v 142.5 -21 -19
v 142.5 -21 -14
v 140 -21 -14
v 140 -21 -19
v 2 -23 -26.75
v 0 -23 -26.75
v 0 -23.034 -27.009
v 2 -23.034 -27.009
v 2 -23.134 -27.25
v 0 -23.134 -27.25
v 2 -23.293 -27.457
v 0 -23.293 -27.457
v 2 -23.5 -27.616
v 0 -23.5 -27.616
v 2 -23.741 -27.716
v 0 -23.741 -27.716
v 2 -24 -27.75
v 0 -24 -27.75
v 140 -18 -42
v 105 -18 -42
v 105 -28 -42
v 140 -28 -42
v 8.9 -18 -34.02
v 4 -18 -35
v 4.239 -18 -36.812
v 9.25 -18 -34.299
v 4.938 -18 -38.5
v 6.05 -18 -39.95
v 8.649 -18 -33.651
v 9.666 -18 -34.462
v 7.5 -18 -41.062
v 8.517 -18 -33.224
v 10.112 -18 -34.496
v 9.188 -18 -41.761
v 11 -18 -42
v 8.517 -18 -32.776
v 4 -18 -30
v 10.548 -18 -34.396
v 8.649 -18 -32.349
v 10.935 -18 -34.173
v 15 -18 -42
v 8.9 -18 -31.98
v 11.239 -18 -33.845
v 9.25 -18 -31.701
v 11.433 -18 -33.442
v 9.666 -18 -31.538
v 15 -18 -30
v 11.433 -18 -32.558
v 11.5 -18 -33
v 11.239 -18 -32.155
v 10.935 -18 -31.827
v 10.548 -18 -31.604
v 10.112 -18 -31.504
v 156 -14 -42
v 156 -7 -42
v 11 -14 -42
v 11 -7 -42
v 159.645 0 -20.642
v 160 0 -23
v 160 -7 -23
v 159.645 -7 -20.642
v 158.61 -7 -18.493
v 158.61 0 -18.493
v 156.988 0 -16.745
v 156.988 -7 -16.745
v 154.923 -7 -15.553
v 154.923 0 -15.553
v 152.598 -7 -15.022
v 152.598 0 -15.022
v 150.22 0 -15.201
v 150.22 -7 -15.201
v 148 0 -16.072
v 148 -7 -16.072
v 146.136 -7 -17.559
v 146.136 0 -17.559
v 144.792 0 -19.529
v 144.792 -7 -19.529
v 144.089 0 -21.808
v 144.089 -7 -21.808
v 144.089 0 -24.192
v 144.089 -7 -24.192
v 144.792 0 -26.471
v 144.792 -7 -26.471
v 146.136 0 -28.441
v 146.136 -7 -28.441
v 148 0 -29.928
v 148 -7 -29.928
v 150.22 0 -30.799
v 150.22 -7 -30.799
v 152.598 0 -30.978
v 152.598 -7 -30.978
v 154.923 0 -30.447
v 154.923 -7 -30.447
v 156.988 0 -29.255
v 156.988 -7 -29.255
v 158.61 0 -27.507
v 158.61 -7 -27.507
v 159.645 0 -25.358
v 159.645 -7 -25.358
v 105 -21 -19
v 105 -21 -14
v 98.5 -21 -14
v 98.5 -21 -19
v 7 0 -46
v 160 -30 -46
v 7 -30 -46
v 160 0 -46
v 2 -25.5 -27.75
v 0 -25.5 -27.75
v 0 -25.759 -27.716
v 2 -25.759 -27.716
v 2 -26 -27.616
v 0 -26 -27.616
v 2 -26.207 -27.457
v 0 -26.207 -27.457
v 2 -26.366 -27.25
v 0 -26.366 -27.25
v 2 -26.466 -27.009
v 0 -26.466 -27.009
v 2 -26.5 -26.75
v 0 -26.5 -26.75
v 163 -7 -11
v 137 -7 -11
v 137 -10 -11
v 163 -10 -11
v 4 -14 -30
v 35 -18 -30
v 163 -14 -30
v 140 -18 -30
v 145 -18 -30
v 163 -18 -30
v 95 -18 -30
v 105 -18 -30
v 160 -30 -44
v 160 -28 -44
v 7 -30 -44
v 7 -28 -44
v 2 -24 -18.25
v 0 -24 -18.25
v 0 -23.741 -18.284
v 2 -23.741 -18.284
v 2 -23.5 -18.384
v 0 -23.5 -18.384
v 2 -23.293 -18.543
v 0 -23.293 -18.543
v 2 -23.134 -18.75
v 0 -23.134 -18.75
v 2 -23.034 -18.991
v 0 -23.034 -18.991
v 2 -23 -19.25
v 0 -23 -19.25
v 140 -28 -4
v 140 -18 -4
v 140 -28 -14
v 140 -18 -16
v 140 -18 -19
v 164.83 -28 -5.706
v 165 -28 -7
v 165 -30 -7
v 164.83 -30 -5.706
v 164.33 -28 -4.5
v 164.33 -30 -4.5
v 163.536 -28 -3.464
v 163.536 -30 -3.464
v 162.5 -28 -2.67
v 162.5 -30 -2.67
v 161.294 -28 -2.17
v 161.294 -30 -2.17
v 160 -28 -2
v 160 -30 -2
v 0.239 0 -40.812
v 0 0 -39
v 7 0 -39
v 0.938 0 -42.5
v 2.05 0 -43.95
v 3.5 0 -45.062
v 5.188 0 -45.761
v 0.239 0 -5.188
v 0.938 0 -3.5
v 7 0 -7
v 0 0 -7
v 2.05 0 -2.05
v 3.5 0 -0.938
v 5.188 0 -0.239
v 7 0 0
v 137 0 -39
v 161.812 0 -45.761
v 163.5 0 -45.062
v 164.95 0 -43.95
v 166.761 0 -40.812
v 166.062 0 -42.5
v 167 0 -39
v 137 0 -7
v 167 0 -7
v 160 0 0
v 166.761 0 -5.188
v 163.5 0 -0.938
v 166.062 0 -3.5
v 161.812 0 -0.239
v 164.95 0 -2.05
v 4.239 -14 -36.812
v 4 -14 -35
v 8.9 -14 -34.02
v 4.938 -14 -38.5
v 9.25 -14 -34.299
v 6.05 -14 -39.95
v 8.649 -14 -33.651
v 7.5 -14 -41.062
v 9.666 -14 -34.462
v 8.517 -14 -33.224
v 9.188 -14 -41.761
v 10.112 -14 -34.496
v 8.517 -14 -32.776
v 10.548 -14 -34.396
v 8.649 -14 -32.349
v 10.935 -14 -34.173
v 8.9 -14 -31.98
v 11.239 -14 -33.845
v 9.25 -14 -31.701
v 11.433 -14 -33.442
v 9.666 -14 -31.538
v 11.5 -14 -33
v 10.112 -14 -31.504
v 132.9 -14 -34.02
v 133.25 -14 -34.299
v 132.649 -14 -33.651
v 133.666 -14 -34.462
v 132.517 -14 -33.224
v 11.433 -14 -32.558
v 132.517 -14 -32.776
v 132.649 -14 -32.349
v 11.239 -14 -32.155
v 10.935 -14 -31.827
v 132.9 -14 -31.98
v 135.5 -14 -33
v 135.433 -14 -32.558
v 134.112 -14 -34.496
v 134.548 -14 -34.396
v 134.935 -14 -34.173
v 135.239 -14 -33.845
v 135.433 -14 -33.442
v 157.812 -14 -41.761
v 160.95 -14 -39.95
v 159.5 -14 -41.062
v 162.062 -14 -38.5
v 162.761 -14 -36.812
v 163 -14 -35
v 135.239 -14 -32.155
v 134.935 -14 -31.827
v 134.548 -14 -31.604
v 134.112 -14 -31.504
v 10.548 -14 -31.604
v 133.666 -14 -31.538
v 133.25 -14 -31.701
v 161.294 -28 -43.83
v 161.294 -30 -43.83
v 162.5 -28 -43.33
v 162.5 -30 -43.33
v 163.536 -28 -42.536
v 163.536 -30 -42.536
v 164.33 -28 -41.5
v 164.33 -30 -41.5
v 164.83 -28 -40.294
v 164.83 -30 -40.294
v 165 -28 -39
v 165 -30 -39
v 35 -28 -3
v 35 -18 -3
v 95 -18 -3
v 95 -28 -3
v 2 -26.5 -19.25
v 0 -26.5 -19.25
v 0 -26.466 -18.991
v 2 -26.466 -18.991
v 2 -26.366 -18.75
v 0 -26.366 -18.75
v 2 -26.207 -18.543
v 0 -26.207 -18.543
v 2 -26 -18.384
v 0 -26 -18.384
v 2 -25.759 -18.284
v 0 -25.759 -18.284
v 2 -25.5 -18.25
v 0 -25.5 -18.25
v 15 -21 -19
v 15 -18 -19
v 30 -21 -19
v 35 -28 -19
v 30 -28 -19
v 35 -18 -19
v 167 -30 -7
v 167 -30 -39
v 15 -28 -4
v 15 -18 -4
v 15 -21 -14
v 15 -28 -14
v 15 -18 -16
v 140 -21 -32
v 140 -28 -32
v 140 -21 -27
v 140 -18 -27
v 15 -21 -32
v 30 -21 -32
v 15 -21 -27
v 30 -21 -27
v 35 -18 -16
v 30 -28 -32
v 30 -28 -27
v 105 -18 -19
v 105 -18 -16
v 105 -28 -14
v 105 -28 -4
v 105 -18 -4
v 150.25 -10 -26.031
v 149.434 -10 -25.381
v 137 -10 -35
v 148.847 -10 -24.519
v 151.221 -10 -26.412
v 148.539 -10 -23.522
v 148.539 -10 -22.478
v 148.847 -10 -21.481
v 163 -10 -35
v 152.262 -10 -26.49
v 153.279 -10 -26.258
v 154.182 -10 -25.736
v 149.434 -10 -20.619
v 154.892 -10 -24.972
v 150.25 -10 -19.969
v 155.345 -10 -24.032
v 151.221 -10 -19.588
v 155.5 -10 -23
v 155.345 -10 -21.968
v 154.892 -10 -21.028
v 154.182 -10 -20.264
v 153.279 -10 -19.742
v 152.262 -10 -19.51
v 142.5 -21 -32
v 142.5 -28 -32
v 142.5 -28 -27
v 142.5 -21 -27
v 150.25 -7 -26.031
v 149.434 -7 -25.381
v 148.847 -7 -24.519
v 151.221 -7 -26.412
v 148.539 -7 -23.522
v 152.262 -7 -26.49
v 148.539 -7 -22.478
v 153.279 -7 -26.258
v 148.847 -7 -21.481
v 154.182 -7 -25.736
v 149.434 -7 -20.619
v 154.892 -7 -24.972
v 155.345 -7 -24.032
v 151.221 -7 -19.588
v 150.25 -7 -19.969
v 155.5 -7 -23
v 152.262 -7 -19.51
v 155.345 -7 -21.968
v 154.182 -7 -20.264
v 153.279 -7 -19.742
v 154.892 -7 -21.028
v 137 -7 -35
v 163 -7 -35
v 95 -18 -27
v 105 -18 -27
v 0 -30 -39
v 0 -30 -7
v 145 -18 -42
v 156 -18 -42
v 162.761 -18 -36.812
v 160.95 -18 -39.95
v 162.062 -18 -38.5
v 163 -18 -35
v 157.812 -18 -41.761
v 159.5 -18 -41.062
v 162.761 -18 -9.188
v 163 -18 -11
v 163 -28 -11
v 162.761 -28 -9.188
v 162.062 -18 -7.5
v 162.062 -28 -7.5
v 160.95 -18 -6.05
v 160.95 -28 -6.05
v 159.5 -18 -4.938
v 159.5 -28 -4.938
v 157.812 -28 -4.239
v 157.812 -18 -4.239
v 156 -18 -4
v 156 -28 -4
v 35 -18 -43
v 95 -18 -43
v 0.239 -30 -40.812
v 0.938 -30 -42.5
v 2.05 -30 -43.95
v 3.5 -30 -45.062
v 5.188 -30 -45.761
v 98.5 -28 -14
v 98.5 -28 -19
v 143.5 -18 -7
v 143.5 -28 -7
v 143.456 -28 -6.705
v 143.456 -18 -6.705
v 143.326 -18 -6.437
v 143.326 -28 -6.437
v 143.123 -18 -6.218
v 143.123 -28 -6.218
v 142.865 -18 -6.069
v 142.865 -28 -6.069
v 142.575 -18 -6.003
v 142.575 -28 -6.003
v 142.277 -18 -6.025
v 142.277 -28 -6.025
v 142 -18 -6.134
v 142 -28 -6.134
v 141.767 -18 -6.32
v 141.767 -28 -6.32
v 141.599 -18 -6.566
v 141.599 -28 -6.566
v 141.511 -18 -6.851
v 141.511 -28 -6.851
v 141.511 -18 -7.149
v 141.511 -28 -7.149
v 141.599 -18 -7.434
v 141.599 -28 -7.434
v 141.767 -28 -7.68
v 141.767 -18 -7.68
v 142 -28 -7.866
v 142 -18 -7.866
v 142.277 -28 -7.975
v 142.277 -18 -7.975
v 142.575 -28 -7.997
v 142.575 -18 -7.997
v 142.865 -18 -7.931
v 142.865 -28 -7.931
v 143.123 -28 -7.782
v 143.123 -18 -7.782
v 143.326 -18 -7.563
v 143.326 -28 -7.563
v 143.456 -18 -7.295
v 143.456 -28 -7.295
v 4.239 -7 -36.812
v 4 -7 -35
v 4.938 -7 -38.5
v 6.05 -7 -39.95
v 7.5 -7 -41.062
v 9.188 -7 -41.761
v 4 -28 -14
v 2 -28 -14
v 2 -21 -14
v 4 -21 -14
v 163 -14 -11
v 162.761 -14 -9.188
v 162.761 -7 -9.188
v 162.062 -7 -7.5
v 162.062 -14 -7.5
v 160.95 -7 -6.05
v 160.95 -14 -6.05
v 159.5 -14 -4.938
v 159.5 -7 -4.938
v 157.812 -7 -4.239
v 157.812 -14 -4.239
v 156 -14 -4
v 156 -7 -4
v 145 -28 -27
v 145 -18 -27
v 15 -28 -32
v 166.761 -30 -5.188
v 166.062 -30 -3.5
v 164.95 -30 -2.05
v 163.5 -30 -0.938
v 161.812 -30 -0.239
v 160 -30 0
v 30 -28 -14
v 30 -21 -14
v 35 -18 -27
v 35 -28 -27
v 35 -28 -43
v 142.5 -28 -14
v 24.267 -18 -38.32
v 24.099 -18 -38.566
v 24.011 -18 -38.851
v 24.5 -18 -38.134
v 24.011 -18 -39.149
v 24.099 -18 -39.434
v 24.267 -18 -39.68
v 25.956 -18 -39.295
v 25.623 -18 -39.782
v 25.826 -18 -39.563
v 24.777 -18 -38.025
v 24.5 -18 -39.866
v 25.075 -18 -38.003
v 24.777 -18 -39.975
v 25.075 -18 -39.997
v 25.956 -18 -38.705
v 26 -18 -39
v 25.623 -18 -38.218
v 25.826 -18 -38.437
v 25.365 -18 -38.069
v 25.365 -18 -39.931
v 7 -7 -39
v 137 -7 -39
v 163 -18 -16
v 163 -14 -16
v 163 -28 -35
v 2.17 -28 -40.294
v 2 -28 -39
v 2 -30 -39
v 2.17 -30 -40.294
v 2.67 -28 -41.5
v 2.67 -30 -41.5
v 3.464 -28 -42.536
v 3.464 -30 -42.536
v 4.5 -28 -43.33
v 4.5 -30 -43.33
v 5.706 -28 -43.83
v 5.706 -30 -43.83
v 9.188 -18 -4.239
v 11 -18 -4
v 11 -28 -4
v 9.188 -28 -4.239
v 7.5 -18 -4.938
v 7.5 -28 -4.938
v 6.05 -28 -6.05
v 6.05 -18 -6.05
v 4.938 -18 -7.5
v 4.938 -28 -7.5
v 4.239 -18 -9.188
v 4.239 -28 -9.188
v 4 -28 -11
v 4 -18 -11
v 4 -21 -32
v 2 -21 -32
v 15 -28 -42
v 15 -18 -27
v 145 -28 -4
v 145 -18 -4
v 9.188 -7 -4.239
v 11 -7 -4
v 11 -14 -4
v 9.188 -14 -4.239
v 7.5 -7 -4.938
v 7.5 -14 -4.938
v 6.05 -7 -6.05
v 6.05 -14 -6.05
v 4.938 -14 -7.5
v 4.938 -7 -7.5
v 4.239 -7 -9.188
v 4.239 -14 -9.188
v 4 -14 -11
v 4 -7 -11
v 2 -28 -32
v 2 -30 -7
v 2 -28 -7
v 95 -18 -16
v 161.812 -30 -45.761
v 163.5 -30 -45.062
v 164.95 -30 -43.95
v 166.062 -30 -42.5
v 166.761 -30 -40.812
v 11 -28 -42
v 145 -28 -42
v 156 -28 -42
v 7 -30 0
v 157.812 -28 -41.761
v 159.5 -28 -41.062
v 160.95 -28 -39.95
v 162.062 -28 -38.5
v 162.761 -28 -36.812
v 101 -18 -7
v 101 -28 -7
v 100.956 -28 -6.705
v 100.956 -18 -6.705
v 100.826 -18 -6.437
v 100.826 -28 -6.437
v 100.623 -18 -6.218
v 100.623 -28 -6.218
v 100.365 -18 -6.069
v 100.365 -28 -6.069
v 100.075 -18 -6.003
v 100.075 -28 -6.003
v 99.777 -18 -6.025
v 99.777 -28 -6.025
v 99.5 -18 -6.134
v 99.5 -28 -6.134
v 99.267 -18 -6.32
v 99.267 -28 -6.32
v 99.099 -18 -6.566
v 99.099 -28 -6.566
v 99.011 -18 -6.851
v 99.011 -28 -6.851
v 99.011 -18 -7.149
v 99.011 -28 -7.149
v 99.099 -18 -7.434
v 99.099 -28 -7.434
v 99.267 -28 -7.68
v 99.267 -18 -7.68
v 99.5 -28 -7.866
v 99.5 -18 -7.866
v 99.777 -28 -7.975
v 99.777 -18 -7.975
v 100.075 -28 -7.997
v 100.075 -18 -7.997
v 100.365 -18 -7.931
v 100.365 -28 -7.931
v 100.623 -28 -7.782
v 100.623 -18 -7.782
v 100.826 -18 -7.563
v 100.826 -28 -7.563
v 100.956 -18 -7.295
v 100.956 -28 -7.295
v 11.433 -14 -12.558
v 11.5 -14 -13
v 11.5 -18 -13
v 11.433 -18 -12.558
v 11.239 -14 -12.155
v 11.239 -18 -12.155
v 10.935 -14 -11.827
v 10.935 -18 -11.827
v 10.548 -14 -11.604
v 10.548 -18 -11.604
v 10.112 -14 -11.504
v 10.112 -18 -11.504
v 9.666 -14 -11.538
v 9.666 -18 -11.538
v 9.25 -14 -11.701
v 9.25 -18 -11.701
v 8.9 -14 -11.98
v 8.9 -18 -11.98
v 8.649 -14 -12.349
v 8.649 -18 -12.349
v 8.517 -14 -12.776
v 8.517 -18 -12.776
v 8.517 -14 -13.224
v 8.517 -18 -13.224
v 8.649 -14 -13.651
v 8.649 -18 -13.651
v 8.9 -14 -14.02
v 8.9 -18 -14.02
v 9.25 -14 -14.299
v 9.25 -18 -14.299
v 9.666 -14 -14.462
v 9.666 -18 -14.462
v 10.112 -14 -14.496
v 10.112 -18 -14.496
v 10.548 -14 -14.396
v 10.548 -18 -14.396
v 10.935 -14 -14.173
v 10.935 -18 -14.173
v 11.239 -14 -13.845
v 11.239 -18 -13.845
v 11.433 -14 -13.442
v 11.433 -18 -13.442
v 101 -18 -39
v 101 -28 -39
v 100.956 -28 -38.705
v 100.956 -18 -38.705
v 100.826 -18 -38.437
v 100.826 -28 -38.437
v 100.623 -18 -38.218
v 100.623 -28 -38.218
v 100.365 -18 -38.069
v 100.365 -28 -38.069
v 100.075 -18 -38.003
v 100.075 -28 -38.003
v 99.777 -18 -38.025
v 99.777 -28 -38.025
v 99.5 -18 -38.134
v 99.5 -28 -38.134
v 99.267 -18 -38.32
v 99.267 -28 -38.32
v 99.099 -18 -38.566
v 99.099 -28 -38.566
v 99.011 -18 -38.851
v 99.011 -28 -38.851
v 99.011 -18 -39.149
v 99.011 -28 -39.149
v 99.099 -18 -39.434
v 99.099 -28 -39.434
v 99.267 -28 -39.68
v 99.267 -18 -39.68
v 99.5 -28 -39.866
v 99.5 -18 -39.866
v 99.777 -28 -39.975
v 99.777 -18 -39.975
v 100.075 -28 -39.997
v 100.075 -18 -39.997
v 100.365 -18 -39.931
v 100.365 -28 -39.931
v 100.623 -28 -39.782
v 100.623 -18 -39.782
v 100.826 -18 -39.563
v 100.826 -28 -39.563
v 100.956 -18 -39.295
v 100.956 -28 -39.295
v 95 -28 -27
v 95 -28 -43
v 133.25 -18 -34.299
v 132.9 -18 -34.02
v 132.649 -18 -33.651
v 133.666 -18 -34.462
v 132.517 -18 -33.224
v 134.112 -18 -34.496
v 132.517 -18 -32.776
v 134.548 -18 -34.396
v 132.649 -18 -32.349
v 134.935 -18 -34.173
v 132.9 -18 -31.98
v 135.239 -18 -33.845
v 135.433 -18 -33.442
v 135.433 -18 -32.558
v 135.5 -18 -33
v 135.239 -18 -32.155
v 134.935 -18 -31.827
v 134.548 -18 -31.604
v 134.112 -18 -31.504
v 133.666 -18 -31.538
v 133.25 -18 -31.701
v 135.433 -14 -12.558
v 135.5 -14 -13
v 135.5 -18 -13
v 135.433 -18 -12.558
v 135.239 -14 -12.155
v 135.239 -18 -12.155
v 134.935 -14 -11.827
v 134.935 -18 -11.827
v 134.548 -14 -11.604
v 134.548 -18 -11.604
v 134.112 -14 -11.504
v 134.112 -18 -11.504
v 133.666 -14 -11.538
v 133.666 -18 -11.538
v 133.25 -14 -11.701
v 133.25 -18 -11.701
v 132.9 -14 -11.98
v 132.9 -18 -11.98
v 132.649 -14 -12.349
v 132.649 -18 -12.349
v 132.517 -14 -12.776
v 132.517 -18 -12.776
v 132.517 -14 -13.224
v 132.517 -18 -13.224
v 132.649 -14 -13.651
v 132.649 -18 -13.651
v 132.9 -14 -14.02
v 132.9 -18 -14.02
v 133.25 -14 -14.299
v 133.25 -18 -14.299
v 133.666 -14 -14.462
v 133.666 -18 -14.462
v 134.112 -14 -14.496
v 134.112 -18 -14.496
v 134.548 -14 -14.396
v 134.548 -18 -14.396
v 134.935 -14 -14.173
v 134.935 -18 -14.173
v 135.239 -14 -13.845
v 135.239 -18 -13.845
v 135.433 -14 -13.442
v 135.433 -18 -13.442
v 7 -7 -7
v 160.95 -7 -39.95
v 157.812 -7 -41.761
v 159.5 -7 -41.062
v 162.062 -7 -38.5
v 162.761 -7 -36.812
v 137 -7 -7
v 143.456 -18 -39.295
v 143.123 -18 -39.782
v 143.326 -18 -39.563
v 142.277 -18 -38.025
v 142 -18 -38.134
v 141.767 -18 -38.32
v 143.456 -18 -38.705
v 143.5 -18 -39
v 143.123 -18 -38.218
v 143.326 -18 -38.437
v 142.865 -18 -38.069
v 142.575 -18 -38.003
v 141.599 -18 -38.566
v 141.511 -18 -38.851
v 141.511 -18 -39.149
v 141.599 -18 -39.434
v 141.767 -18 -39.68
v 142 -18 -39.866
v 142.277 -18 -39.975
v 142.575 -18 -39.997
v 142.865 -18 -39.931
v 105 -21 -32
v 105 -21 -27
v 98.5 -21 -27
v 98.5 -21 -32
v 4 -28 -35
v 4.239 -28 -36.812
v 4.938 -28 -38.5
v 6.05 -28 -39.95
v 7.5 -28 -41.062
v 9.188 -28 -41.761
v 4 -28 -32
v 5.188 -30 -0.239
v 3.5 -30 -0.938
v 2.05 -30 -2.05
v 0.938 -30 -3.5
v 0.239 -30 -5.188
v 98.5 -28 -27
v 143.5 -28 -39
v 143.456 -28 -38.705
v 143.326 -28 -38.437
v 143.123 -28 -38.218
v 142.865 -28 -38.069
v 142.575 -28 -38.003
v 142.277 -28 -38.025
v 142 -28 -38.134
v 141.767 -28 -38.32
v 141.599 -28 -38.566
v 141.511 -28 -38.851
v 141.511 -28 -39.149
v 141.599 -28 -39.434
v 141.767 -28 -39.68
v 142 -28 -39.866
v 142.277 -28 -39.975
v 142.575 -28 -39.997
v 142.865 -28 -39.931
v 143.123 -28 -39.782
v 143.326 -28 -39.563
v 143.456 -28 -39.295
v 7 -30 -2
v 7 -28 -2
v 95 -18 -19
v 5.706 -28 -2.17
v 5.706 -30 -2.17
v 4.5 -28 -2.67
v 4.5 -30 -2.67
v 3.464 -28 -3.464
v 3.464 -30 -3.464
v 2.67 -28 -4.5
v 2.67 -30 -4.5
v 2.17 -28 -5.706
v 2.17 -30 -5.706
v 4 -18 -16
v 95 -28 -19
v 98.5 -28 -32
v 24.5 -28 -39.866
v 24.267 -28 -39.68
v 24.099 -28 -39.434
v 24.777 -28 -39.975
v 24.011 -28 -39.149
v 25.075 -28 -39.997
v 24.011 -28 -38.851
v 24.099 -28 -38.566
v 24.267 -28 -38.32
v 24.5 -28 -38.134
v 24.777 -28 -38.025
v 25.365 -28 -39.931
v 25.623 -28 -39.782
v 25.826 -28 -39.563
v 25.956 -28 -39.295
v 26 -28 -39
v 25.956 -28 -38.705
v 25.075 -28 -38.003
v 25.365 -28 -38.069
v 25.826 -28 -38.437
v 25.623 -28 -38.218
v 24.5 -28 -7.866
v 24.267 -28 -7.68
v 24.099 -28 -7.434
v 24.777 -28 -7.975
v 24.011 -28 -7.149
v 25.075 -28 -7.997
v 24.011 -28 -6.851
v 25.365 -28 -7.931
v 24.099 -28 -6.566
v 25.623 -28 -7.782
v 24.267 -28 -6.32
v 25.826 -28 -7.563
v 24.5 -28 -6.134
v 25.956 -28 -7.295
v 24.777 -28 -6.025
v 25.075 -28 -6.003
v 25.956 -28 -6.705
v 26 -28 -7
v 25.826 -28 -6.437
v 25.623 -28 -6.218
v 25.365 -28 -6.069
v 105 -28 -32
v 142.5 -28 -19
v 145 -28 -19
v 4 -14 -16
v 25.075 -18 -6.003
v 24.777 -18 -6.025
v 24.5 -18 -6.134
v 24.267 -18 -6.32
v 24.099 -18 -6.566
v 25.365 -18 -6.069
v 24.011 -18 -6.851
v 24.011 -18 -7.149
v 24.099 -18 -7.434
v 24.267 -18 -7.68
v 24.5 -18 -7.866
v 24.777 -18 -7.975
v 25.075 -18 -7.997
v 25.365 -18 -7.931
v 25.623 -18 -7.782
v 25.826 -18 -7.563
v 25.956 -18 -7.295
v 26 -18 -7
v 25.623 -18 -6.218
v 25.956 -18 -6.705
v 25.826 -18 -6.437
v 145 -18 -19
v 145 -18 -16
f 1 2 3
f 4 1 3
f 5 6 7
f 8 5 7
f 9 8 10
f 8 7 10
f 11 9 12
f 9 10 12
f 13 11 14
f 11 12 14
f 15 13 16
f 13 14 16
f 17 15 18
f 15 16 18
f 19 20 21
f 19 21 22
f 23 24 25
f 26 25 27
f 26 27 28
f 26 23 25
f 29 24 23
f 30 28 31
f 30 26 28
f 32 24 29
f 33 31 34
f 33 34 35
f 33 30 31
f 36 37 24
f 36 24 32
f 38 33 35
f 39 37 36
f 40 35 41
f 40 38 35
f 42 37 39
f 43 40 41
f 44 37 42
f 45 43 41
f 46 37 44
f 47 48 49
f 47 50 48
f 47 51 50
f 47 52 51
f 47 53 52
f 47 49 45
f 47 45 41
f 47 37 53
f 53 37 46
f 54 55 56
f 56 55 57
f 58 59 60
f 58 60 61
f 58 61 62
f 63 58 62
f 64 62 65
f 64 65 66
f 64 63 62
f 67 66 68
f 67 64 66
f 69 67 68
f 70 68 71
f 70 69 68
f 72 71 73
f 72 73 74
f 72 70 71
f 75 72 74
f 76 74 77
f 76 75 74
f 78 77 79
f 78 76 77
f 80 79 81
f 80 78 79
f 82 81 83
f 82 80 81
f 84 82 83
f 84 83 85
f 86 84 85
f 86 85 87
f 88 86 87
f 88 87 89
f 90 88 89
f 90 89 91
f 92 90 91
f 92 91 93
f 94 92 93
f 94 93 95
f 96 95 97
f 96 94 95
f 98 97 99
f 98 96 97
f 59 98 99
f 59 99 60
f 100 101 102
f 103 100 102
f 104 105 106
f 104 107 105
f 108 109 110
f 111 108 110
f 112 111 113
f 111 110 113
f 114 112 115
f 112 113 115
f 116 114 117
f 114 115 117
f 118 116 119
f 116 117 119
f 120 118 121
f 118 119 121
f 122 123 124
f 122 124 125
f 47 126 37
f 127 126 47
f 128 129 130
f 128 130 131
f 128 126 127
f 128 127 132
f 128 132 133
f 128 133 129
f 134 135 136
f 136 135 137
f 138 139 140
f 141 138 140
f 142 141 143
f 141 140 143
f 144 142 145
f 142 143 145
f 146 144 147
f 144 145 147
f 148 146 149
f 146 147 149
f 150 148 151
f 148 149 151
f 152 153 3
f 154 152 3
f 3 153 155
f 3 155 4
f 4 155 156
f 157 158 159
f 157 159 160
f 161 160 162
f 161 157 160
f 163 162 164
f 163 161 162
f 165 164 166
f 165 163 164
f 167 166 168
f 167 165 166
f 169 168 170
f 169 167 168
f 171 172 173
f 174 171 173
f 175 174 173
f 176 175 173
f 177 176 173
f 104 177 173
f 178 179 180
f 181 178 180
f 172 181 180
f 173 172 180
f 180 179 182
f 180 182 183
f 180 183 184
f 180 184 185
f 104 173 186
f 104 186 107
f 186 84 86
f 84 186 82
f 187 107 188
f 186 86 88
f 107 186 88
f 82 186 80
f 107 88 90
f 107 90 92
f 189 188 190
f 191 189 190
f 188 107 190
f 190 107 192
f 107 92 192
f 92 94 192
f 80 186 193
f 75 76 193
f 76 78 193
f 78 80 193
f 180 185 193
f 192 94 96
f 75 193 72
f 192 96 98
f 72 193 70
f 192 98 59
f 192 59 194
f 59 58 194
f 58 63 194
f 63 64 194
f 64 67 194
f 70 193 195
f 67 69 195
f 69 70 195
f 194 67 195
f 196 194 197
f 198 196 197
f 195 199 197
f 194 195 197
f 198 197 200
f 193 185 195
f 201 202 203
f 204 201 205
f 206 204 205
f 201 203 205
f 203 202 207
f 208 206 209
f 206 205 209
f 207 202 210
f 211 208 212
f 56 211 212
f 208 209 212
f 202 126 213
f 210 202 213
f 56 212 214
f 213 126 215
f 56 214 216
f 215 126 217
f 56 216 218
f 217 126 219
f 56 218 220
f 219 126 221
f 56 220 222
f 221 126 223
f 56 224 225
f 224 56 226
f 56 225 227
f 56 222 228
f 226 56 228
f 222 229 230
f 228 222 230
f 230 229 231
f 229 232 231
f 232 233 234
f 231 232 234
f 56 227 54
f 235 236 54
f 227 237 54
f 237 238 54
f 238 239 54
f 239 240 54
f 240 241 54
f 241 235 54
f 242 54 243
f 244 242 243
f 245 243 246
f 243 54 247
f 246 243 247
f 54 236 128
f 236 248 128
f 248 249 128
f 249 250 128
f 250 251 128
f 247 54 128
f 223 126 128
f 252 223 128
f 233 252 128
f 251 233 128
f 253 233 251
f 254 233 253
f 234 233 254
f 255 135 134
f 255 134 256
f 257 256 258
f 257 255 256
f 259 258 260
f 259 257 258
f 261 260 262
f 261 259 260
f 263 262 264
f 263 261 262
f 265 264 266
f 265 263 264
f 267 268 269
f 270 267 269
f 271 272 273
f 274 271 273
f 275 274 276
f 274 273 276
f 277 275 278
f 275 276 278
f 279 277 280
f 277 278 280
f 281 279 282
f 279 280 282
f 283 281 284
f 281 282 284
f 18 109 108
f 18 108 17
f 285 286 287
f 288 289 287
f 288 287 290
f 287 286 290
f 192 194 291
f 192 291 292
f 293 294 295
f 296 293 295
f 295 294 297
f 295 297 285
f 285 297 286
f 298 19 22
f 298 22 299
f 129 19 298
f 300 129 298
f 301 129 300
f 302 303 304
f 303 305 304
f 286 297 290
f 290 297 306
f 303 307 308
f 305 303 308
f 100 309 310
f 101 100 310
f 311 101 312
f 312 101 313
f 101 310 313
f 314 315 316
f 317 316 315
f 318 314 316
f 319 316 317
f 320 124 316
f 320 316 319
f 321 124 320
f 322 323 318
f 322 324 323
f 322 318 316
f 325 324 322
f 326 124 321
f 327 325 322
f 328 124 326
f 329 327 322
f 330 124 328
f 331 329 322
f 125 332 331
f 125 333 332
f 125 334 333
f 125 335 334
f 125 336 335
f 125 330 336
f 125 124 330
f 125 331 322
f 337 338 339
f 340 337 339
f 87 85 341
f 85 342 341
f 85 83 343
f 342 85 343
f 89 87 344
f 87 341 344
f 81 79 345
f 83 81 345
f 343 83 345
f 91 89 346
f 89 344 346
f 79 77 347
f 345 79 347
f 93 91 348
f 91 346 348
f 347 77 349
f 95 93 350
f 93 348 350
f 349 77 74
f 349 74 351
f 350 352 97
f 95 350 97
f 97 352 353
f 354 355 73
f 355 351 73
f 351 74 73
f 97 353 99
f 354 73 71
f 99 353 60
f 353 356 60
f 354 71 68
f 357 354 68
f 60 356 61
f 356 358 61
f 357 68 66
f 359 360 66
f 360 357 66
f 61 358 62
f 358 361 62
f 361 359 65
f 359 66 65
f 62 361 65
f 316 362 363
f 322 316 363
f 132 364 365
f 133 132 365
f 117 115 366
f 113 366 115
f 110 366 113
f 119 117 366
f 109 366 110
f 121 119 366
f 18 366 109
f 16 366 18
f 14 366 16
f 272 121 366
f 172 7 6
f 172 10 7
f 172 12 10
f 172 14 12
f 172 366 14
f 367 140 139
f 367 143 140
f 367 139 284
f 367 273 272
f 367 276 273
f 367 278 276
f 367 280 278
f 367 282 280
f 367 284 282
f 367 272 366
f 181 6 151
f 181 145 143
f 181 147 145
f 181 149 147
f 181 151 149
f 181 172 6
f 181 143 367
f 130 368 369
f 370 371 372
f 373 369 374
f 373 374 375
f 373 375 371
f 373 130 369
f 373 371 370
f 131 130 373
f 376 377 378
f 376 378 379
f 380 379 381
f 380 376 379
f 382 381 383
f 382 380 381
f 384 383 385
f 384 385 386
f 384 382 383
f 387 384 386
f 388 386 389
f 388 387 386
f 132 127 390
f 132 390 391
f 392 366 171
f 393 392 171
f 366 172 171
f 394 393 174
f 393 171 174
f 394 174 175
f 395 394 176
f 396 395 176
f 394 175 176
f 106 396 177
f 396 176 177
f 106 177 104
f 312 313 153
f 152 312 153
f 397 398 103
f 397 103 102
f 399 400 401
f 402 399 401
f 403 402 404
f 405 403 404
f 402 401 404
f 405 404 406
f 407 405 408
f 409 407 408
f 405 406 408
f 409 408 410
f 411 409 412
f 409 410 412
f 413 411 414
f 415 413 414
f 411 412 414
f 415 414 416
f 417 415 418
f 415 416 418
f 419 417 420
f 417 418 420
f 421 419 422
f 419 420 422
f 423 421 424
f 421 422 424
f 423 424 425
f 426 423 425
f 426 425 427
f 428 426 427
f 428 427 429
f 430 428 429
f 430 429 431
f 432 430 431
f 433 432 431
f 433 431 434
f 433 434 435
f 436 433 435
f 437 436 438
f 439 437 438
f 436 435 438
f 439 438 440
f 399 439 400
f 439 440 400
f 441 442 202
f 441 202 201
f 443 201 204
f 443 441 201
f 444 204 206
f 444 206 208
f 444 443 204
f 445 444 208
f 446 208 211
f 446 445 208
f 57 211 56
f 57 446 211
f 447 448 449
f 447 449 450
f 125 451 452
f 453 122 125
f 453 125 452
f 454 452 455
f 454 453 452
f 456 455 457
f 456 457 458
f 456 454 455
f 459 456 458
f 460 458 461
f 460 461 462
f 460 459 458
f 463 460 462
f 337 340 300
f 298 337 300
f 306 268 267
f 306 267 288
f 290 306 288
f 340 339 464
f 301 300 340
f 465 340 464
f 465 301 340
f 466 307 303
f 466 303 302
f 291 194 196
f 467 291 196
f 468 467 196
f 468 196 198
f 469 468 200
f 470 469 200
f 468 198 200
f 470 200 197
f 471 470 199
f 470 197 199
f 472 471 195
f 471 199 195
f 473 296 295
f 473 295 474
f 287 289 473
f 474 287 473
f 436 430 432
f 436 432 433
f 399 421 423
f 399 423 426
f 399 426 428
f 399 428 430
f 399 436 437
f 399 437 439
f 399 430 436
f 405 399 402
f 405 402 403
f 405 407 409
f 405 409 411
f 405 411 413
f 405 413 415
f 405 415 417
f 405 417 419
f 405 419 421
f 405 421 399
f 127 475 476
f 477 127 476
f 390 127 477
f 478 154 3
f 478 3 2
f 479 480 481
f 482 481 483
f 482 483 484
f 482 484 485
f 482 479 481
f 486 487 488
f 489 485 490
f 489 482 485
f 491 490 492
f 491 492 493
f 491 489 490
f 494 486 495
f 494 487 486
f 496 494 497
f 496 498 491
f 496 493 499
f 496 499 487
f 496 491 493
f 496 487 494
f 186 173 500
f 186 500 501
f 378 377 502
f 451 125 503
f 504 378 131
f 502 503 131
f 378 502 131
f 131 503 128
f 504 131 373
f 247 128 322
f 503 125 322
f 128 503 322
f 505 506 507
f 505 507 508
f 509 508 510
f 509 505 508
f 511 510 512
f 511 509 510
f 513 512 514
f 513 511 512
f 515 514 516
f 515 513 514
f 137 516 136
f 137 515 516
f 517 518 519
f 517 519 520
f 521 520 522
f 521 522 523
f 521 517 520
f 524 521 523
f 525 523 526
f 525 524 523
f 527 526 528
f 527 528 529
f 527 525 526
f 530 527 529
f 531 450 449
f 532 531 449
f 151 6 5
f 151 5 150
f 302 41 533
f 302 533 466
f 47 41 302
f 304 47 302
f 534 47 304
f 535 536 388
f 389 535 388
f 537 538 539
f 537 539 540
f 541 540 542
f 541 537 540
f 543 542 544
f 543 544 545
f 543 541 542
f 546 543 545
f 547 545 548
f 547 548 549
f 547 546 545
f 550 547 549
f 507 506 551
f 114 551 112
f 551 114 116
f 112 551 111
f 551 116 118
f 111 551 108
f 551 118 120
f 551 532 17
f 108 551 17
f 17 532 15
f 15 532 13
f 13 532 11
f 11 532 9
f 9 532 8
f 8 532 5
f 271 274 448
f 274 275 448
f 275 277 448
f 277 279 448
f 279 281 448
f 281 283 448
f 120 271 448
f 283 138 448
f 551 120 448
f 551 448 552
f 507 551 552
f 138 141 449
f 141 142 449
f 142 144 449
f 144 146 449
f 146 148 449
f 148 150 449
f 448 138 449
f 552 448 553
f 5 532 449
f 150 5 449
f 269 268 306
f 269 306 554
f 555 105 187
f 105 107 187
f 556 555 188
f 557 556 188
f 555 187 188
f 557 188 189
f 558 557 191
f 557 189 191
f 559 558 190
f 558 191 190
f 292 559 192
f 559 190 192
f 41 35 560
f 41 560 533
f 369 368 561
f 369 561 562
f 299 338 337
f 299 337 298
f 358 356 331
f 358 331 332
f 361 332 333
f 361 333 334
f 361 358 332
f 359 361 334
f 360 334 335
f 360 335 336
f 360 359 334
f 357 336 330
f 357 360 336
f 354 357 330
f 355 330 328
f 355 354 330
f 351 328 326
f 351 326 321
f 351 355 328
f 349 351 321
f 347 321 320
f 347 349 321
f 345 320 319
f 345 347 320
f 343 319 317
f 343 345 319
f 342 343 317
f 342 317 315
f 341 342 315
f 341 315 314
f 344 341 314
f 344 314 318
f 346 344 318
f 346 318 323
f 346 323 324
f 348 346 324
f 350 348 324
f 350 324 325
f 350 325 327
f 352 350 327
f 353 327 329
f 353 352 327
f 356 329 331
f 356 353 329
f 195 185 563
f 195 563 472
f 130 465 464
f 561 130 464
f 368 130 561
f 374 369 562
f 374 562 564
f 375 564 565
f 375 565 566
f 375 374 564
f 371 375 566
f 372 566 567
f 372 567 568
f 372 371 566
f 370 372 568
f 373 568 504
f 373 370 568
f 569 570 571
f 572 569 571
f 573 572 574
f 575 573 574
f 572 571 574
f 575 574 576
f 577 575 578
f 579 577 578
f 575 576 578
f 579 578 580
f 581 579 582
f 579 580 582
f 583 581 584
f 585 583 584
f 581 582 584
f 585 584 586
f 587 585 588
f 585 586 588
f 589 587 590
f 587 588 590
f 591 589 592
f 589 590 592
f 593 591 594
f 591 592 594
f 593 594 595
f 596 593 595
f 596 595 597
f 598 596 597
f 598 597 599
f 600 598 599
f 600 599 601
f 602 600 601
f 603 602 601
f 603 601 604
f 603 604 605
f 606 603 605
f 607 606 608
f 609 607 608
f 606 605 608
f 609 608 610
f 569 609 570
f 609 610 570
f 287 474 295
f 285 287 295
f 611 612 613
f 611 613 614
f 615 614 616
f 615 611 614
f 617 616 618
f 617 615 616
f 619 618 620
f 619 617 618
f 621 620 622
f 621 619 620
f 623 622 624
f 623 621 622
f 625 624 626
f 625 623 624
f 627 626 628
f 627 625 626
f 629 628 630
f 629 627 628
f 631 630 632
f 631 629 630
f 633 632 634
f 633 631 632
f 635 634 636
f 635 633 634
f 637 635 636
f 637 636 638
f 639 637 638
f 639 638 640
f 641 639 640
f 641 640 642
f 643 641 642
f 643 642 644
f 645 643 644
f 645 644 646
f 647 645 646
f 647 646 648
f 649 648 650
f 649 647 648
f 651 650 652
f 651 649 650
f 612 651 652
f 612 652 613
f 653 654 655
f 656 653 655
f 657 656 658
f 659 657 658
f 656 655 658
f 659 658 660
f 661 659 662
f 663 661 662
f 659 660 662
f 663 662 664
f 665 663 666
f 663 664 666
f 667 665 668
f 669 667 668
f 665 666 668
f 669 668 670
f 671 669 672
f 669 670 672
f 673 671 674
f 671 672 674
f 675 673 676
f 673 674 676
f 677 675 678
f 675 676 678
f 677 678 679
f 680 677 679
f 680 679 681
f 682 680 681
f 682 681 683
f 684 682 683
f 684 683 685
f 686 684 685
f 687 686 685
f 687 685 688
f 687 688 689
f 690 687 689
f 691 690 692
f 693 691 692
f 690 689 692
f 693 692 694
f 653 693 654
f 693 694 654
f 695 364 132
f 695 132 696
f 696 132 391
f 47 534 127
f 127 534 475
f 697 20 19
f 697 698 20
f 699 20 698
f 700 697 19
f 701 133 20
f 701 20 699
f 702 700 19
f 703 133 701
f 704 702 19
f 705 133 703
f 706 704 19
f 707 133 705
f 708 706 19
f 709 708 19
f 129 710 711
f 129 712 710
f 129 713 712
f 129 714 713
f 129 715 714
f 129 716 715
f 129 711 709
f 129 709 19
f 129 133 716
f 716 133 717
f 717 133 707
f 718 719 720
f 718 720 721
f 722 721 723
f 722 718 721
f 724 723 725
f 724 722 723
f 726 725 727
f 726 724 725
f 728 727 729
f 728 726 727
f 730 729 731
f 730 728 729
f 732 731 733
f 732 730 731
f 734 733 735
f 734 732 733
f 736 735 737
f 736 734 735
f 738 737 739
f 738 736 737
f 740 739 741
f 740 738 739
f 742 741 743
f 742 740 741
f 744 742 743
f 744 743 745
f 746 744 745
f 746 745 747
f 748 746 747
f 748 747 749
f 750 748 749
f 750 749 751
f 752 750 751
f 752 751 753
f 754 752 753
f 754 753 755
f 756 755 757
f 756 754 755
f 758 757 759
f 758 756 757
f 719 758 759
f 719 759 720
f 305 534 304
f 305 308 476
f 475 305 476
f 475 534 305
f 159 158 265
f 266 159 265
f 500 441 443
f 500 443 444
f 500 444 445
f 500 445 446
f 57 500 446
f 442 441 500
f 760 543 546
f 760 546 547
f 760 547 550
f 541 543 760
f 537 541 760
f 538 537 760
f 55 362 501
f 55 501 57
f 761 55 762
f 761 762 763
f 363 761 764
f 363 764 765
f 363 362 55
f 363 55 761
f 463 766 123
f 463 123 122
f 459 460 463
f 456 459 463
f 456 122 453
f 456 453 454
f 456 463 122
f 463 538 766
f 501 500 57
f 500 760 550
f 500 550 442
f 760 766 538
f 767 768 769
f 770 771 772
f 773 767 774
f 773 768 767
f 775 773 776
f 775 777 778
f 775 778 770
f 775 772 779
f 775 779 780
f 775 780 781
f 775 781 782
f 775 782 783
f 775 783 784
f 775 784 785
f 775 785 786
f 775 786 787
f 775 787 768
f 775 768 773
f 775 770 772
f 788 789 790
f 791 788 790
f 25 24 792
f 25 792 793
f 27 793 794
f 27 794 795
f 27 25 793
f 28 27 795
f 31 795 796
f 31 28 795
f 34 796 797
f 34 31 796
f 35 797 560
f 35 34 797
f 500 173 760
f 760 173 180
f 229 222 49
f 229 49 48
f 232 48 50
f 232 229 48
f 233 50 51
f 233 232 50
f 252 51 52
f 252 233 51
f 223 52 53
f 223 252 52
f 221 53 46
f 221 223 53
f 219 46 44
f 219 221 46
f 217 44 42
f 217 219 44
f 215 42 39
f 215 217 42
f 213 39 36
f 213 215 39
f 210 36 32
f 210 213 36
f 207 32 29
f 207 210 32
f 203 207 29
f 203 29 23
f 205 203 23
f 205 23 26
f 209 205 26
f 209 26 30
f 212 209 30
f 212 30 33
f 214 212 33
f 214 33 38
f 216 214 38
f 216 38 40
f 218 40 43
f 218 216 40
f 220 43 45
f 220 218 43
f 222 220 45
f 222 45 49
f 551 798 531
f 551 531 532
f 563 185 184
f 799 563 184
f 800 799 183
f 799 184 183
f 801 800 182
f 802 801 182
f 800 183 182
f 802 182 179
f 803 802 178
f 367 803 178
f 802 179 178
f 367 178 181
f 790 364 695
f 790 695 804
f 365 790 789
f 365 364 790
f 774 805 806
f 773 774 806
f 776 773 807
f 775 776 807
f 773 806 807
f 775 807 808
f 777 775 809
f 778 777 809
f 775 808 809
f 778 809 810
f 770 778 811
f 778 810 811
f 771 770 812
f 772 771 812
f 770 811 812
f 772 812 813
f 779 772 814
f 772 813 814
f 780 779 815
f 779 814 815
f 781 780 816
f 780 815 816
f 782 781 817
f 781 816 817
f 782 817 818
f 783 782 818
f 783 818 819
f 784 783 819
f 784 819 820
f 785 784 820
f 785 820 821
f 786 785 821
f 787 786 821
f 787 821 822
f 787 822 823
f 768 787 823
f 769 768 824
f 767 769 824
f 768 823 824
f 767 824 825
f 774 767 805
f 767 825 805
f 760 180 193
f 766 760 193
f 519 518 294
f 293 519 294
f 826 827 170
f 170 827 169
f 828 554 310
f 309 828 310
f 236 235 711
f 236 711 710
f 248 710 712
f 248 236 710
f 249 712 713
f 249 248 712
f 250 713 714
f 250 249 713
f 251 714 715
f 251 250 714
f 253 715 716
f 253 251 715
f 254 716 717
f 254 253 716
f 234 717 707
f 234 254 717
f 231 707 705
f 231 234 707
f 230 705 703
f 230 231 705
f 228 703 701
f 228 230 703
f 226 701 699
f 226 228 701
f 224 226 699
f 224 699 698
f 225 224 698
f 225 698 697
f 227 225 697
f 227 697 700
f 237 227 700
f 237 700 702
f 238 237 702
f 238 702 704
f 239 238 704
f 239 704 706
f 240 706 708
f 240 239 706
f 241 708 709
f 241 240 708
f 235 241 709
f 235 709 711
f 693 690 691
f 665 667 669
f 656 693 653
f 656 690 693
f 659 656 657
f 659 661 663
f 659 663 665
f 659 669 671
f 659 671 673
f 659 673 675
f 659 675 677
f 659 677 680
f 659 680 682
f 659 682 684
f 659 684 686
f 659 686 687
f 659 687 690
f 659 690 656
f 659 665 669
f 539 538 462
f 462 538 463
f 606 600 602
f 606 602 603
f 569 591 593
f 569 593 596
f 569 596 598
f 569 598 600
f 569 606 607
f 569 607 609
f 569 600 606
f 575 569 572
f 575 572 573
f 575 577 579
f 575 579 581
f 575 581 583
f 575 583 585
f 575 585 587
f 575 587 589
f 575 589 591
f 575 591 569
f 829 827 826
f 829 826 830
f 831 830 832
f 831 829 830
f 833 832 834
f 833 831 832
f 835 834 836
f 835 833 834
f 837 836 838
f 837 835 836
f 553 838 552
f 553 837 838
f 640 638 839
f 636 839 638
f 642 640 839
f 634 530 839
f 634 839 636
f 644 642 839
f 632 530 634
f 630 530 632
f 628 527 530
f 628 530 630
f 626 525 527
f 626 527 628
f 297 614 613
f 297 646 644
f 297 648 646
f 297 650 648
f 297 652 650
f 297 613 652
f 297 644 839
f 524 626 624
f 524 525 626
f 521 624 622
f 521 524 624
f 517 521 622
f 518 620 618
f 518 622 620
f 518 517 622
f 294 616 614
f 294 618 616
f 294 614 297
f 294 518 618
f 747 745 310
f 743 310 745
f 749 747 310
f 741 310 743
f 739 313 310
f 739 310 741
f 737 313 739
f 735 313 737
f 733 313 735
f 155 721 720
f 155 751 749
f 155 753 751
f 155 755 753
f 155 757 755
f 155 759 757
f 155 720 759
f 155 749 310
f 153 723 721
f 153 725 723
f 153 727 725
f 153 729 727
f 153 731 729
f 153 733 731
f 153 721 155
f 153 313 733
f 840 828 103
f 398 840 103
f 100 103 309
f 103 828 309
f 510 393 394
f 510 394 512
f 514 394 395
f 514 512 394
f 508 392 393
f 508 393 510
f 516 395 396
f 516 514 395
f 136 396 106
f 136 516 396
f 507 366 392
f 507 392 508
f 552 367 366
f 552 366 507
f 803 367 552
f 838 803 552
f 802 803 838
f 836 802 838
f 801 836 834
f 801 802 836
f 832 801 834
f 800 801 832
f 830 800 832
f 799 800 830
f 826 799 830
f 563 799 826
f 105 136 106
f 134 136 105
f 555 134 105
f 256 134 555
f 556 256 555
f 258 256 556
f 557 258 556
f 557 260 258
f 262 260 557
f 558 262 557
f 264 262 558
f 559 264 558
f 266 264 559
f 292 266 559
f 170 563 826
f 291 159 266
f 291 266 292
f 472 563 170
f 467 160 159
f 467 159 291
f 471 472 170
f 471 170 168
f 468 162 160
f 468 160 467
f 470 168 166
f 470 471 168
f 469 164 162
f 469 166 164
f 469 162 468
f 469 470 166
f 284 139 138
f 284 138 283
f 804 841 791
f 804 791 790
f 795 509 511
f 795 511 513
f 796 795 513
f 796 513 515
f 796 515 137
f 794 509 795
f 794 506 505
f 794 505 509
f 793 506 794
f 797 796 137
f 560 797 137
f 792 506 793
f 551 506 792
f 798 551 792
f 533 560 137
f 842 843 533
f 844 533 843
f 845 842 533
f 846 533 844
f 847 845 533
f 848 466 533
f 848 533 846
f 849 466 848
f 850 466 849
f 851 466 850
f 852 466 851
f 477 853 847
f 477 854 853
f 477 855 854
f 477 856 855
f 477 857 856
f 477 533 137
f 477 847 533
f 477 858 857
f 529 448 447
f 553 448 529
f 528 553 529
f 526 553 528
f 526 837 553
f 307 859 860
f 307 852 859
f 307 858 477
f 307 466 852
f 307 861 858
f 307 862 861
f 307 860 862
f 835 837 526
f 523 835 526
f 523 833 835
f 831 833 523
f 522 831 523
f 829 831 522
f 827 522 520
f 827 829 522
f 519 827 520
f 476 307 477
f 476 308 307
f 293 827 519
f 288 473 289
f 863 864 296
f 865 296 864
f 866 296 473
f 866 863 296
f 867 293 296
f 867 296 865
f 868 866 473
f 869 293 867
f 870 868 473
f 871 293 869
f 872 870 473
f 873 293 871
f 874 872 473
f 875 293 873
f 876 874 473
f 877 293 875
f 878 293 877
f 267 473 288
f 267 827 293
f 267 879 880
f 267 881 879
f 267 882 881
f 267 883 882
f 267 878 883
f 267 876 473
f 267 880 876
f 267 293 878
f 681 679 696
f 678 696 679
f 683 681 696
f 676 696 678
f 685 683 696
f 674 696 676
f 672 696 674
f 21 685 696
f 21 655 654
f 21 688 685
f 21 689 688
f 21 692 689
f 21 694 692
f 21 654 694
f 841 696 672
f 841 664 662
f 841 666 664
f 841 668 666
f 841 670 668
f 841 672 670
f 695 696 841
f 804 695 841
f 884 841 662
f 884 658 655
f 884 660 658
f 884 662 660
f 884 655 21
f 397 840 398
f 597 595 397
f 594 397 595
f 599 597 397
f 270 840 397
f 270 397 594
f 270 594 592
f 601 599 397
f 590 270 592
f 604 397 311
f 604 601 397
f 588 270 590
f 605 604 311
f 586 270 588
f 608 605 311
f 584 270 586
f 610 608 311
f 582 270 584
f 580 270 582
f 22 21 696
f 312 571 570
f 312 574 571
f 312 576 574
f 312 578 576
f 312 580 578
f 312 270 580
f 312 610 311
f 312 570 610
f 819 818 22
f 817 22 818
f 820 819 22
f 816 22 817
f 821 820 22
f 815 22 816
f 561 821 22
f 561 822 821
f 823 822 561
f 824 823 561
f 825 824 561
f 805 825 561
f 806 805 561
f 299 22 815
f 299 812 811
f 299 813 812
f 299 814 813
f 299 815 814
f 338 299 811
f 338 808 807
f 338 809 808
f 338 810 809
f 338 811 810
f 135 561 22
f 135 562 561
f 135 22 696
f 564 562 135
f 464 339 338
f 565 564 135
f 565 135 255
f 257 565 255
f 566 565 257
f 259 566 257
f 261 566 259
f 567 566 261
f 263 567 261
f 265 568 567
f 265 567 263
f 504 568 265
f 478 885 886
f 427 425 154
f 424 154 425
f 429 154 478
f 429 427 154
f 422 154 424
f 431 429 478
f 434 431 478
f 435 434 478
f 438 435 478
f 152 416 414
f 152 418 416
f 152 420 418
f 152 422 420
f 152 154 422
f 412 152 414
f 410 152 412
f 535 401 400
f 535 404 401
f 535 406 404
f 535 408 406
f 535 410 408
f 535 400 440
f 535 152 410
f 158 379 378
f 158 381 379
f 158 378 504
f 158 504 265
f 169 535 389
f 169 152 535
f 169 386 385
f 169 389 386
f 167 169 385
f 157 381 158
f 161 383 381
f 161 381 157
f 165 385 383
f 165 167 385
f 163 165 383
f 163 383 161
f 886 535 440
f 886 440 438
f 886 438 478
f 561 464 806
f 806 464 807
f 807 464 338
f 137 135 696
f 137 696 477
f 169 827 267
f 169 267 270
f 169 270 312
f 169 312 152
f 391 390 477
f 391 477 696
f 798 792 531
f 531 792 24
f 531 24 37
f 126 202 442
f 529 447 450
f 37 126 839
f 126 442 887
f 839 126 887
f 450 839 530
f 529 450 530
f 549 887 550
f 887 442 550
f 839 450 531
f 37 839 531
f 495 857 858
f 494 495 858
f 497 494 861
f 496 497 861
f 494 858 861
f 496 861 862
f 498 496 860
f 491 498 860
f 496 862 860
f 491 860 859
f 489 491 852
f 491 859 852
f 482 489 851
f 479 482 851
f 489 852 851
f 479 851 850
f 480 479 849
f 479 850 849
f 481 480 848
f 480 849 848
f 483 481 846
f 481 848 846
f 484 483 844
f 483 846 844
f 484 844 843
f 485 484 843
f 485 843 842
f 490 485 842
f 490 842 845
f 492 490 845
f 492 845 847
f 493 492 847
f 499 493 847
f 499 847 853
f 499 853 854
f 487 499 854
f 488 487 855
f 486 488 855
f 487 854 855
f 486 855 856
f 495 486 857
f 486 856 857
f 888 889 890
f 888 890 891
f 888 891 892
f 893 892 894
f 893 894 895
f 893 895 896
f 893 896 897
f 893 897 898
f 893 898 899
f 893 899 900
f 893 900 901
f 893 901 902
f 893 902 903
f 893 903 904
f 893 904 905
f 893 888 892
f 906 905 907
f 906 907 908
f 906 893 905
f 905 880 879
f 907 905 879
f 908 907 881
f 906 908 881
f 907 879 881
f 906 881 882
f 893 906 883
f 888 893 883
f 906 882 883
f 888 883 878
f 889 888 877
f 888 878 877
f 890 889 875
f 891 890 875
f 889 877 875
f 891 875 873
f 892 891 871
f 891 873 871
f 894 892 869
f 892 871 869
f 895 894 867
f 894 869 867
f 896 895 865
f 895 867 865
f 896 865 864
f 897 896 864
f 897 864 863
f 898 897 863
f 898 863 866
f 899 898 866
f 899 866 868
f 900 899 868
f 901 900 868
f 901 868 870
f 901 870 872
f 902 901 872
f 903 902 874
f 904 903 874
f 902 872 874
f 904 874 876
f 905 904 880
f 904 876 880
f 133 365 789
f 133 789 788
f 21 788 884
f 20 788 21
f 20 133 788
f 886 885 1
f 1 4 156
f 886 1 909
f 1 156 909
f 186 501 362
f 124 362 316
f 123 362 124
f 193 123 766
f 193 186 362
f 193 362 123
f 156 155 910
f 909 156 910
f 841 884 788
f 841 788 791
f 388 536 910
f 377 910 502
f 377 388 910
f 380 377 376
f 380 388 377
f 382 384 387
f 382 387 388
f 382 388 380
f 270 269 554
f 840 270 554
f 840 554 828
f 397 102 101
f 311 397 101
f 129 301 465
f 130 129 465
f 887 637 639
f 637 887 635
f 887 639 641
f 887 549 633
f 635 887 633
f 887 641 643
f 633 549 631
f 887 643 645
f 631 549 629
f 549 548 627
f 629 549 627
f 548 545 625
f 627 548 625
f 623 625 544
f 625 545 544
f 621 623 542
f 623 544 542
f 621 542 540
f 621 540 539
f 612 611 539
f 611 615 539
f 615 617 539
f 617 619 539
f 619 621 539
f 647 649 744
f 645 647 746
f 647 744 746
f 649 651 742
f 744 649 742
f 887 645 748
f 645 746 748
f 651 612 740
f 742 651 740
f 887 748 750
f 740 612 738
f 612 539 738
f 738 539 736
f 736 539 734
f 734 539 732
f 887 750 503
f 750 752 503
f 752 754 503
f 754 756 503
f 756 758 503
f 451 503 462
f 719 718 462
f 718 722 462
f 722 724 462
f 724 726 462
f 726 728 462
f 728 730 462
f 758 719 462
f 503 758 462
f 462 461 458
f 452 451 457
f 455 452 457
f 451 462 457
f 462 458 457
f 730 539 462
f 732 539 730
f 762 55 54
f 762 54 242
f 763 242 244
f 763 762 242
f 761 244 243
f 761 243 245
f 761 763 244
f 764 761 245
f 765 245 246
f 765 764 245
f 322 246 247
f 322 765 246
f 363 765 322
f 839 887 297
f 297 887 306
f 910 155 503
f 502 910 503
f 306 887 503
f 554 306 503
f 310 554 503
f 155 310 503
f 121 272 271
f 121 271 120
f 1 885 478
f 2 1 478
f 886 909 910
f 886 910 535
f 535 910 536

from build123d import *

# Parameters (mm, degrees)
SKETCH_R        = 8
SKETCH_W        = 130
SKETCH_H        = 32
PAD_DEPTH       = 7
PAD001_DEPTH    = 7
SKETCH003_W     = 26
SKETCH003_H     = 24
SKETCH003_R     = 3.5
PAD002_DEPTH    = 3
SKETCH004_R     = 1.5
SKETCH004_W     = 159
SKETCH004_H     = 14
PAD003_DEPTH    = 4
PAD004_DEPTH    = 10
POCKET_DEPTH    = 7
POCKET001_DEPTH = 10
PAD005_DEPTH    = 2
SKETCH009_R     = 1
POCKET002_DEPTH = 10


with BuildPart() as part:
    # Sketch → Pad (new body)
    with BuildSketch(Plane.XZ):
        with BuildLine():
            ThreePointArc((7, 0), (2.050253, -2.050253), (0, -7))
            Line((0, -39), (0, -7))
            ThreePointArc((0, -39), (2.050253, -43.949747), (7, -46))
            Line((160, -46), (7, -46))
            ThreePointArc((160, -46), (164.949747, -43.949747), (167, -39))
            Line((167, -7), (167, -39))
            ThreePointArc((167, -7), (164.949747, -2.050253), (160, 0))
            Line((7, 0), (160, 0))
        make_face()
        with Locations((152, -23)):
            Circle(SKETCH_R, mode=Mode.SUBTRACT)
        with Locations((72, -23)):
            Rectangle(SKETCH_W, SKETCH_H, mode=Mode.SUBTRACT)
    extrude(amount=PAD_DEPTH)

    # Sketch002 (on Face15 of Pad) → Pad001 (join)
    with BuildSketch(Plane.XZ.offset(7)):
        with BuildLine():
            ThreePointArc((7, 0), (2.050253, -2.050253), (0, -7))
            Line((0, -39), (0, -7))
            ThreePointArc((0, -39), (2.050253, -43.949747), (7, -46))
            Line((160, -46), (7, -46))
            ThreePointArc((160, -46), (164.949747, -43.949747), (167, -39))
            Line((167, -7), (167, -39))
            ThreePointArc((167, -7), (164.949747, -2.050253), (160, 0))
            Line((7, 0), (160, 0))
        make_face()
        with BuildLine():
            ThreePointArc((11, -4), (6.050253, -6.050253), (4, -11))
            Line((4, -35), (4, -11))
            ThreePointArc((4, -35), (6.050253, -39.949747), (11, -42))
            Line((156, -42), (11, -42))
            ThreePointArc((156, -42), (160.949747, -39.949747), (163, -35))
            Line((163, -11), (163, -35))
            ThreePointArc((163, -11), (160.949747, -6.050253), (156, -4))
            Line((11, -4), (156, -4))
        make_face(mode=Mode.SUBTRACT)
    extrude(amount=PAD001_DEPTH)

    # Sketch003 (on Face24 of Pad001) → Pad002 (join)
    with BuildSketch(Plane.XZ.offset(7)):
        with Locations((150, -23)):
            Rectangle(SKETCH003_W, SKETCH003_H)
        with Locations((152, -23)):
            Circle(SKETCH003_R, mode=Mode.SUBTRACT)
    extrude(amount=PAD002_DEPTH)

    # Sketch004 (on Face18 of Pad002) → Pad003 (join)
    with BuildSketch(Plane.XZ.offset(14)):
        with BuildLine():
            ThreePointArc((7, 0), (2.050253, -2.050253), (0, -7))
            Line((0, -39), (0, -7))
            ThreePointArc((0, -39), (2.050253, -43.949747), (7, -46))
            Line((160, -46), (7, -46))
            ThreePointArc((160, -46), (164.949747, -43.949747), (167, -39))
            Line((167, -7), (167, -39))
            ThreePointArc((167, -7), (164.949747, -2.050253), (160, 0))
            Line((7, 0), (160, 0))
        make_face()
        with Locations((10, -13)):
            Circle(SKETCH004_R, mode=Mode.SUBTRACT)
        with Locations((10, -33)):
            Circle(SKETCH004_R, mode=Mode.SUBTRACT)
        with Locations((134, -13)):
            Circle(SKETCH004_R, mode=Mode.SUBTRACT)
        with Locations((134, -33)):
            Circle(SKETCH004_R, mode=Mode.SUBTRACT)
        with Locations((83.5, -23)):
            Rectangle(SKETCH004_W, SKETCH004_H, mode=Mode.SUBTRACT)
    extrude(amount=PAD003_DEPTH)

    # Sketch005 (on Face29 of Pad003) → Pad004 (join)
    with BuildSketch(Plane.XZ.offset(18)):
        with BuildLine():
            ThreePointArc((7, 0), (2.050253, -2.050253), (0, -7))
            Line((0, -39), (0, -7))
            ThreePointArc((0, -39), (2.050253, -43.949747), (7, -46))
            Line((160, -46), (7, -46))
            ThreePointArc((160, -46), (164.949747, -43.949747), (167, -39))
            Line((167, -7), (167, -39))
            ThreePointArc((167, -7), (164.949747, -2.050253), (160, 0))
            Line((7, 0), (160, 0))
        make_face()
        with BuildLine():
            ThreePointArc((11, -4), (6.050253, -6.050253), (4, -11))
            Line((4, -35), (4, -11))
            ThreePointArc((4, -35), (6.050253, -39.949747), (11, -42))
            Line((11, -42), (15, -42))
            Line((15, -42), (15, -27))
            Line((15, -27), (35, -27))
            Line((35, -27), (35, -43))
            Line((35, -43), (95, -43))
            Line((95, -27), (95, -43))
            Line((95, -27), (105, -27))
            Line((105, -27), (105, -42))
            Line((105, -42), (140, -42))
            Line((140, -42), (140, -27))
            Line((140, -27), (145, -27))
            Line((145, -27), (145, -42))
            Line((145, -42), (156, -42))
            ThreePointArc((156, -42), (160.949747, -39.949747), (163, -35))
            Line((163, -11), (163, -35))
            ThreePointArc((163, -11), (160.949747, -6.050253), (156, -4))
            Line((145, -4), (156, -4))
            Line((145, -19), (145, -4))
            Line((140, -19), (145, -19))
            Line((140, -4), (140, -19))
            Line((105, -4), (140, -4))
            Line((105, -19), (105, -4))
            Line((95, -19), (105, -19))
            Line((95, -3), (95, -19))
            Line((35, -3), (95, -3))
            Line((35, -3), (35, -19))
            Line((15, -19), (35, -19))
            Line((15, -4), (15, -19))
            Line((11, -4), (15, -4))
        make_face(mode=Mode.SUBTRACT)
    extrude(amount=PAD004_DEPTH)

    # Sketch006 (on Face48 of Pad004) → Pocket (cut)
    with BuildSketch(Plane.XZ.offset(28)):
        Polygon((2, -14), (30, -14), (30, -23), (30, -32), (2, -32), align=None)
        Polygon((98.5, -14), (142.5, -14), (142.5, -23), (142.5, -32), (98.5, -32), align=None)
    extrude(amount=-POCKET_DEPTH, mode=Mode.SUBTRACT)

    # Sketch007 (on Face33 of Pocket) → Pocket001 (cut)
    with BuildSketch(Plane(origin=(0, 0, 0), x_dir=(0, 0, -1), z_dir=(-1, 0, 0))):
        with BuildLine():
            ThreePointArc((19.25, 26.5), (18.542893, 26.207107), (18.25, 25.5))
            Line((18.25, 24.75), (18.25, 25.5))
            Line((18.25, 24), (18.25, 24.75))
            ThreePointArc((18.25, 24), (18.542893, 23.292893), (19.25, 23))
            Line((26.75, 23), (19.25, 23))
            ThreePointArc((26.75, 23), (27.457107, 23.292893), (27.75, 24))
            Line((27.75, 25.5), (27.75, 24))
            ThreePointArc((27.75, 25.5), (27.457107, 26.207107), (26.75, 26.5))
            Line((23, 26.5), (26.75, 26.5))
            Line((19.25, 26.5), (23, 26.5))
        make_face()
    extrude(amount=-POCKET001_DEPTH, mode=Mode.SUBTRACT)

    # Sketch008 (on Face48 of Pocket001) → Pad005 (join)
    with BuildSketch(Plane.XZ.offset(28)):
        with BuildLine():
            ThreePointArc((7, 0), (2.050253, -2.050253), (0, -7))
            Line((0, -39), (0, -7))
            ThreePointArc((0, -39), (2.050253, -43.949747), (7, -46))
            Line((160, -46), (7, -46))
            ThreePointArc((160, -46), (164.949747, -43.949747), (167, -39))
            Line((167, -7), (167, -39))
            ThreePointArc((167, -7), (164.949747, -2.050253), (160, 0))
            Line((7, 0), (160, 0))
        make_face()
        with BuildLine():
            ThreePointArc((7, -2), (3.464466, -3.464466), (2, -7))
            Line((2, -39), (2, -7))
            ThreePointArc((2, -39), (3.464466, -42.535534), (7, -44))
            Line((160, -44), (7, -44))
            ThreePointArc((160, -44), (163.535534, -42.535534), (165, -39))
            Line((165, -7), (165, -39))
            ThreePointArc((165, -7), (163.535534, -3.464466), (160, -2))
            Line((7, -2), (160, -2))
        make_face(mode=Mode.SUBTRACT)
    extrude(amount=PAD005_DEPTH)

    # Sketch009 (on Face111 of Pad005) → Pocket002 (cut)
    with BuildSketch(Plane.XZ.offset(28)):
        with Locations((25, -7)):
            Circle(SKETCH009_R)
        with Locations((100, -7)):
            Circle(SKETCH009_R)
        with Locations((142.5, -7)):
            Circle(SKETCH009_R)
        with Locations((25, -39)):
            Circle(SKETCH009_R)
        with Locations((100, -39)):
            Circle(SKETCH009_R)
        with Locations((142.5, -39)):
            Circle(SKETCH009_R)
    extrude(amount=-POCKET002_DEPTH, mode=Mode.SUBTRACT)


solid = part.part
